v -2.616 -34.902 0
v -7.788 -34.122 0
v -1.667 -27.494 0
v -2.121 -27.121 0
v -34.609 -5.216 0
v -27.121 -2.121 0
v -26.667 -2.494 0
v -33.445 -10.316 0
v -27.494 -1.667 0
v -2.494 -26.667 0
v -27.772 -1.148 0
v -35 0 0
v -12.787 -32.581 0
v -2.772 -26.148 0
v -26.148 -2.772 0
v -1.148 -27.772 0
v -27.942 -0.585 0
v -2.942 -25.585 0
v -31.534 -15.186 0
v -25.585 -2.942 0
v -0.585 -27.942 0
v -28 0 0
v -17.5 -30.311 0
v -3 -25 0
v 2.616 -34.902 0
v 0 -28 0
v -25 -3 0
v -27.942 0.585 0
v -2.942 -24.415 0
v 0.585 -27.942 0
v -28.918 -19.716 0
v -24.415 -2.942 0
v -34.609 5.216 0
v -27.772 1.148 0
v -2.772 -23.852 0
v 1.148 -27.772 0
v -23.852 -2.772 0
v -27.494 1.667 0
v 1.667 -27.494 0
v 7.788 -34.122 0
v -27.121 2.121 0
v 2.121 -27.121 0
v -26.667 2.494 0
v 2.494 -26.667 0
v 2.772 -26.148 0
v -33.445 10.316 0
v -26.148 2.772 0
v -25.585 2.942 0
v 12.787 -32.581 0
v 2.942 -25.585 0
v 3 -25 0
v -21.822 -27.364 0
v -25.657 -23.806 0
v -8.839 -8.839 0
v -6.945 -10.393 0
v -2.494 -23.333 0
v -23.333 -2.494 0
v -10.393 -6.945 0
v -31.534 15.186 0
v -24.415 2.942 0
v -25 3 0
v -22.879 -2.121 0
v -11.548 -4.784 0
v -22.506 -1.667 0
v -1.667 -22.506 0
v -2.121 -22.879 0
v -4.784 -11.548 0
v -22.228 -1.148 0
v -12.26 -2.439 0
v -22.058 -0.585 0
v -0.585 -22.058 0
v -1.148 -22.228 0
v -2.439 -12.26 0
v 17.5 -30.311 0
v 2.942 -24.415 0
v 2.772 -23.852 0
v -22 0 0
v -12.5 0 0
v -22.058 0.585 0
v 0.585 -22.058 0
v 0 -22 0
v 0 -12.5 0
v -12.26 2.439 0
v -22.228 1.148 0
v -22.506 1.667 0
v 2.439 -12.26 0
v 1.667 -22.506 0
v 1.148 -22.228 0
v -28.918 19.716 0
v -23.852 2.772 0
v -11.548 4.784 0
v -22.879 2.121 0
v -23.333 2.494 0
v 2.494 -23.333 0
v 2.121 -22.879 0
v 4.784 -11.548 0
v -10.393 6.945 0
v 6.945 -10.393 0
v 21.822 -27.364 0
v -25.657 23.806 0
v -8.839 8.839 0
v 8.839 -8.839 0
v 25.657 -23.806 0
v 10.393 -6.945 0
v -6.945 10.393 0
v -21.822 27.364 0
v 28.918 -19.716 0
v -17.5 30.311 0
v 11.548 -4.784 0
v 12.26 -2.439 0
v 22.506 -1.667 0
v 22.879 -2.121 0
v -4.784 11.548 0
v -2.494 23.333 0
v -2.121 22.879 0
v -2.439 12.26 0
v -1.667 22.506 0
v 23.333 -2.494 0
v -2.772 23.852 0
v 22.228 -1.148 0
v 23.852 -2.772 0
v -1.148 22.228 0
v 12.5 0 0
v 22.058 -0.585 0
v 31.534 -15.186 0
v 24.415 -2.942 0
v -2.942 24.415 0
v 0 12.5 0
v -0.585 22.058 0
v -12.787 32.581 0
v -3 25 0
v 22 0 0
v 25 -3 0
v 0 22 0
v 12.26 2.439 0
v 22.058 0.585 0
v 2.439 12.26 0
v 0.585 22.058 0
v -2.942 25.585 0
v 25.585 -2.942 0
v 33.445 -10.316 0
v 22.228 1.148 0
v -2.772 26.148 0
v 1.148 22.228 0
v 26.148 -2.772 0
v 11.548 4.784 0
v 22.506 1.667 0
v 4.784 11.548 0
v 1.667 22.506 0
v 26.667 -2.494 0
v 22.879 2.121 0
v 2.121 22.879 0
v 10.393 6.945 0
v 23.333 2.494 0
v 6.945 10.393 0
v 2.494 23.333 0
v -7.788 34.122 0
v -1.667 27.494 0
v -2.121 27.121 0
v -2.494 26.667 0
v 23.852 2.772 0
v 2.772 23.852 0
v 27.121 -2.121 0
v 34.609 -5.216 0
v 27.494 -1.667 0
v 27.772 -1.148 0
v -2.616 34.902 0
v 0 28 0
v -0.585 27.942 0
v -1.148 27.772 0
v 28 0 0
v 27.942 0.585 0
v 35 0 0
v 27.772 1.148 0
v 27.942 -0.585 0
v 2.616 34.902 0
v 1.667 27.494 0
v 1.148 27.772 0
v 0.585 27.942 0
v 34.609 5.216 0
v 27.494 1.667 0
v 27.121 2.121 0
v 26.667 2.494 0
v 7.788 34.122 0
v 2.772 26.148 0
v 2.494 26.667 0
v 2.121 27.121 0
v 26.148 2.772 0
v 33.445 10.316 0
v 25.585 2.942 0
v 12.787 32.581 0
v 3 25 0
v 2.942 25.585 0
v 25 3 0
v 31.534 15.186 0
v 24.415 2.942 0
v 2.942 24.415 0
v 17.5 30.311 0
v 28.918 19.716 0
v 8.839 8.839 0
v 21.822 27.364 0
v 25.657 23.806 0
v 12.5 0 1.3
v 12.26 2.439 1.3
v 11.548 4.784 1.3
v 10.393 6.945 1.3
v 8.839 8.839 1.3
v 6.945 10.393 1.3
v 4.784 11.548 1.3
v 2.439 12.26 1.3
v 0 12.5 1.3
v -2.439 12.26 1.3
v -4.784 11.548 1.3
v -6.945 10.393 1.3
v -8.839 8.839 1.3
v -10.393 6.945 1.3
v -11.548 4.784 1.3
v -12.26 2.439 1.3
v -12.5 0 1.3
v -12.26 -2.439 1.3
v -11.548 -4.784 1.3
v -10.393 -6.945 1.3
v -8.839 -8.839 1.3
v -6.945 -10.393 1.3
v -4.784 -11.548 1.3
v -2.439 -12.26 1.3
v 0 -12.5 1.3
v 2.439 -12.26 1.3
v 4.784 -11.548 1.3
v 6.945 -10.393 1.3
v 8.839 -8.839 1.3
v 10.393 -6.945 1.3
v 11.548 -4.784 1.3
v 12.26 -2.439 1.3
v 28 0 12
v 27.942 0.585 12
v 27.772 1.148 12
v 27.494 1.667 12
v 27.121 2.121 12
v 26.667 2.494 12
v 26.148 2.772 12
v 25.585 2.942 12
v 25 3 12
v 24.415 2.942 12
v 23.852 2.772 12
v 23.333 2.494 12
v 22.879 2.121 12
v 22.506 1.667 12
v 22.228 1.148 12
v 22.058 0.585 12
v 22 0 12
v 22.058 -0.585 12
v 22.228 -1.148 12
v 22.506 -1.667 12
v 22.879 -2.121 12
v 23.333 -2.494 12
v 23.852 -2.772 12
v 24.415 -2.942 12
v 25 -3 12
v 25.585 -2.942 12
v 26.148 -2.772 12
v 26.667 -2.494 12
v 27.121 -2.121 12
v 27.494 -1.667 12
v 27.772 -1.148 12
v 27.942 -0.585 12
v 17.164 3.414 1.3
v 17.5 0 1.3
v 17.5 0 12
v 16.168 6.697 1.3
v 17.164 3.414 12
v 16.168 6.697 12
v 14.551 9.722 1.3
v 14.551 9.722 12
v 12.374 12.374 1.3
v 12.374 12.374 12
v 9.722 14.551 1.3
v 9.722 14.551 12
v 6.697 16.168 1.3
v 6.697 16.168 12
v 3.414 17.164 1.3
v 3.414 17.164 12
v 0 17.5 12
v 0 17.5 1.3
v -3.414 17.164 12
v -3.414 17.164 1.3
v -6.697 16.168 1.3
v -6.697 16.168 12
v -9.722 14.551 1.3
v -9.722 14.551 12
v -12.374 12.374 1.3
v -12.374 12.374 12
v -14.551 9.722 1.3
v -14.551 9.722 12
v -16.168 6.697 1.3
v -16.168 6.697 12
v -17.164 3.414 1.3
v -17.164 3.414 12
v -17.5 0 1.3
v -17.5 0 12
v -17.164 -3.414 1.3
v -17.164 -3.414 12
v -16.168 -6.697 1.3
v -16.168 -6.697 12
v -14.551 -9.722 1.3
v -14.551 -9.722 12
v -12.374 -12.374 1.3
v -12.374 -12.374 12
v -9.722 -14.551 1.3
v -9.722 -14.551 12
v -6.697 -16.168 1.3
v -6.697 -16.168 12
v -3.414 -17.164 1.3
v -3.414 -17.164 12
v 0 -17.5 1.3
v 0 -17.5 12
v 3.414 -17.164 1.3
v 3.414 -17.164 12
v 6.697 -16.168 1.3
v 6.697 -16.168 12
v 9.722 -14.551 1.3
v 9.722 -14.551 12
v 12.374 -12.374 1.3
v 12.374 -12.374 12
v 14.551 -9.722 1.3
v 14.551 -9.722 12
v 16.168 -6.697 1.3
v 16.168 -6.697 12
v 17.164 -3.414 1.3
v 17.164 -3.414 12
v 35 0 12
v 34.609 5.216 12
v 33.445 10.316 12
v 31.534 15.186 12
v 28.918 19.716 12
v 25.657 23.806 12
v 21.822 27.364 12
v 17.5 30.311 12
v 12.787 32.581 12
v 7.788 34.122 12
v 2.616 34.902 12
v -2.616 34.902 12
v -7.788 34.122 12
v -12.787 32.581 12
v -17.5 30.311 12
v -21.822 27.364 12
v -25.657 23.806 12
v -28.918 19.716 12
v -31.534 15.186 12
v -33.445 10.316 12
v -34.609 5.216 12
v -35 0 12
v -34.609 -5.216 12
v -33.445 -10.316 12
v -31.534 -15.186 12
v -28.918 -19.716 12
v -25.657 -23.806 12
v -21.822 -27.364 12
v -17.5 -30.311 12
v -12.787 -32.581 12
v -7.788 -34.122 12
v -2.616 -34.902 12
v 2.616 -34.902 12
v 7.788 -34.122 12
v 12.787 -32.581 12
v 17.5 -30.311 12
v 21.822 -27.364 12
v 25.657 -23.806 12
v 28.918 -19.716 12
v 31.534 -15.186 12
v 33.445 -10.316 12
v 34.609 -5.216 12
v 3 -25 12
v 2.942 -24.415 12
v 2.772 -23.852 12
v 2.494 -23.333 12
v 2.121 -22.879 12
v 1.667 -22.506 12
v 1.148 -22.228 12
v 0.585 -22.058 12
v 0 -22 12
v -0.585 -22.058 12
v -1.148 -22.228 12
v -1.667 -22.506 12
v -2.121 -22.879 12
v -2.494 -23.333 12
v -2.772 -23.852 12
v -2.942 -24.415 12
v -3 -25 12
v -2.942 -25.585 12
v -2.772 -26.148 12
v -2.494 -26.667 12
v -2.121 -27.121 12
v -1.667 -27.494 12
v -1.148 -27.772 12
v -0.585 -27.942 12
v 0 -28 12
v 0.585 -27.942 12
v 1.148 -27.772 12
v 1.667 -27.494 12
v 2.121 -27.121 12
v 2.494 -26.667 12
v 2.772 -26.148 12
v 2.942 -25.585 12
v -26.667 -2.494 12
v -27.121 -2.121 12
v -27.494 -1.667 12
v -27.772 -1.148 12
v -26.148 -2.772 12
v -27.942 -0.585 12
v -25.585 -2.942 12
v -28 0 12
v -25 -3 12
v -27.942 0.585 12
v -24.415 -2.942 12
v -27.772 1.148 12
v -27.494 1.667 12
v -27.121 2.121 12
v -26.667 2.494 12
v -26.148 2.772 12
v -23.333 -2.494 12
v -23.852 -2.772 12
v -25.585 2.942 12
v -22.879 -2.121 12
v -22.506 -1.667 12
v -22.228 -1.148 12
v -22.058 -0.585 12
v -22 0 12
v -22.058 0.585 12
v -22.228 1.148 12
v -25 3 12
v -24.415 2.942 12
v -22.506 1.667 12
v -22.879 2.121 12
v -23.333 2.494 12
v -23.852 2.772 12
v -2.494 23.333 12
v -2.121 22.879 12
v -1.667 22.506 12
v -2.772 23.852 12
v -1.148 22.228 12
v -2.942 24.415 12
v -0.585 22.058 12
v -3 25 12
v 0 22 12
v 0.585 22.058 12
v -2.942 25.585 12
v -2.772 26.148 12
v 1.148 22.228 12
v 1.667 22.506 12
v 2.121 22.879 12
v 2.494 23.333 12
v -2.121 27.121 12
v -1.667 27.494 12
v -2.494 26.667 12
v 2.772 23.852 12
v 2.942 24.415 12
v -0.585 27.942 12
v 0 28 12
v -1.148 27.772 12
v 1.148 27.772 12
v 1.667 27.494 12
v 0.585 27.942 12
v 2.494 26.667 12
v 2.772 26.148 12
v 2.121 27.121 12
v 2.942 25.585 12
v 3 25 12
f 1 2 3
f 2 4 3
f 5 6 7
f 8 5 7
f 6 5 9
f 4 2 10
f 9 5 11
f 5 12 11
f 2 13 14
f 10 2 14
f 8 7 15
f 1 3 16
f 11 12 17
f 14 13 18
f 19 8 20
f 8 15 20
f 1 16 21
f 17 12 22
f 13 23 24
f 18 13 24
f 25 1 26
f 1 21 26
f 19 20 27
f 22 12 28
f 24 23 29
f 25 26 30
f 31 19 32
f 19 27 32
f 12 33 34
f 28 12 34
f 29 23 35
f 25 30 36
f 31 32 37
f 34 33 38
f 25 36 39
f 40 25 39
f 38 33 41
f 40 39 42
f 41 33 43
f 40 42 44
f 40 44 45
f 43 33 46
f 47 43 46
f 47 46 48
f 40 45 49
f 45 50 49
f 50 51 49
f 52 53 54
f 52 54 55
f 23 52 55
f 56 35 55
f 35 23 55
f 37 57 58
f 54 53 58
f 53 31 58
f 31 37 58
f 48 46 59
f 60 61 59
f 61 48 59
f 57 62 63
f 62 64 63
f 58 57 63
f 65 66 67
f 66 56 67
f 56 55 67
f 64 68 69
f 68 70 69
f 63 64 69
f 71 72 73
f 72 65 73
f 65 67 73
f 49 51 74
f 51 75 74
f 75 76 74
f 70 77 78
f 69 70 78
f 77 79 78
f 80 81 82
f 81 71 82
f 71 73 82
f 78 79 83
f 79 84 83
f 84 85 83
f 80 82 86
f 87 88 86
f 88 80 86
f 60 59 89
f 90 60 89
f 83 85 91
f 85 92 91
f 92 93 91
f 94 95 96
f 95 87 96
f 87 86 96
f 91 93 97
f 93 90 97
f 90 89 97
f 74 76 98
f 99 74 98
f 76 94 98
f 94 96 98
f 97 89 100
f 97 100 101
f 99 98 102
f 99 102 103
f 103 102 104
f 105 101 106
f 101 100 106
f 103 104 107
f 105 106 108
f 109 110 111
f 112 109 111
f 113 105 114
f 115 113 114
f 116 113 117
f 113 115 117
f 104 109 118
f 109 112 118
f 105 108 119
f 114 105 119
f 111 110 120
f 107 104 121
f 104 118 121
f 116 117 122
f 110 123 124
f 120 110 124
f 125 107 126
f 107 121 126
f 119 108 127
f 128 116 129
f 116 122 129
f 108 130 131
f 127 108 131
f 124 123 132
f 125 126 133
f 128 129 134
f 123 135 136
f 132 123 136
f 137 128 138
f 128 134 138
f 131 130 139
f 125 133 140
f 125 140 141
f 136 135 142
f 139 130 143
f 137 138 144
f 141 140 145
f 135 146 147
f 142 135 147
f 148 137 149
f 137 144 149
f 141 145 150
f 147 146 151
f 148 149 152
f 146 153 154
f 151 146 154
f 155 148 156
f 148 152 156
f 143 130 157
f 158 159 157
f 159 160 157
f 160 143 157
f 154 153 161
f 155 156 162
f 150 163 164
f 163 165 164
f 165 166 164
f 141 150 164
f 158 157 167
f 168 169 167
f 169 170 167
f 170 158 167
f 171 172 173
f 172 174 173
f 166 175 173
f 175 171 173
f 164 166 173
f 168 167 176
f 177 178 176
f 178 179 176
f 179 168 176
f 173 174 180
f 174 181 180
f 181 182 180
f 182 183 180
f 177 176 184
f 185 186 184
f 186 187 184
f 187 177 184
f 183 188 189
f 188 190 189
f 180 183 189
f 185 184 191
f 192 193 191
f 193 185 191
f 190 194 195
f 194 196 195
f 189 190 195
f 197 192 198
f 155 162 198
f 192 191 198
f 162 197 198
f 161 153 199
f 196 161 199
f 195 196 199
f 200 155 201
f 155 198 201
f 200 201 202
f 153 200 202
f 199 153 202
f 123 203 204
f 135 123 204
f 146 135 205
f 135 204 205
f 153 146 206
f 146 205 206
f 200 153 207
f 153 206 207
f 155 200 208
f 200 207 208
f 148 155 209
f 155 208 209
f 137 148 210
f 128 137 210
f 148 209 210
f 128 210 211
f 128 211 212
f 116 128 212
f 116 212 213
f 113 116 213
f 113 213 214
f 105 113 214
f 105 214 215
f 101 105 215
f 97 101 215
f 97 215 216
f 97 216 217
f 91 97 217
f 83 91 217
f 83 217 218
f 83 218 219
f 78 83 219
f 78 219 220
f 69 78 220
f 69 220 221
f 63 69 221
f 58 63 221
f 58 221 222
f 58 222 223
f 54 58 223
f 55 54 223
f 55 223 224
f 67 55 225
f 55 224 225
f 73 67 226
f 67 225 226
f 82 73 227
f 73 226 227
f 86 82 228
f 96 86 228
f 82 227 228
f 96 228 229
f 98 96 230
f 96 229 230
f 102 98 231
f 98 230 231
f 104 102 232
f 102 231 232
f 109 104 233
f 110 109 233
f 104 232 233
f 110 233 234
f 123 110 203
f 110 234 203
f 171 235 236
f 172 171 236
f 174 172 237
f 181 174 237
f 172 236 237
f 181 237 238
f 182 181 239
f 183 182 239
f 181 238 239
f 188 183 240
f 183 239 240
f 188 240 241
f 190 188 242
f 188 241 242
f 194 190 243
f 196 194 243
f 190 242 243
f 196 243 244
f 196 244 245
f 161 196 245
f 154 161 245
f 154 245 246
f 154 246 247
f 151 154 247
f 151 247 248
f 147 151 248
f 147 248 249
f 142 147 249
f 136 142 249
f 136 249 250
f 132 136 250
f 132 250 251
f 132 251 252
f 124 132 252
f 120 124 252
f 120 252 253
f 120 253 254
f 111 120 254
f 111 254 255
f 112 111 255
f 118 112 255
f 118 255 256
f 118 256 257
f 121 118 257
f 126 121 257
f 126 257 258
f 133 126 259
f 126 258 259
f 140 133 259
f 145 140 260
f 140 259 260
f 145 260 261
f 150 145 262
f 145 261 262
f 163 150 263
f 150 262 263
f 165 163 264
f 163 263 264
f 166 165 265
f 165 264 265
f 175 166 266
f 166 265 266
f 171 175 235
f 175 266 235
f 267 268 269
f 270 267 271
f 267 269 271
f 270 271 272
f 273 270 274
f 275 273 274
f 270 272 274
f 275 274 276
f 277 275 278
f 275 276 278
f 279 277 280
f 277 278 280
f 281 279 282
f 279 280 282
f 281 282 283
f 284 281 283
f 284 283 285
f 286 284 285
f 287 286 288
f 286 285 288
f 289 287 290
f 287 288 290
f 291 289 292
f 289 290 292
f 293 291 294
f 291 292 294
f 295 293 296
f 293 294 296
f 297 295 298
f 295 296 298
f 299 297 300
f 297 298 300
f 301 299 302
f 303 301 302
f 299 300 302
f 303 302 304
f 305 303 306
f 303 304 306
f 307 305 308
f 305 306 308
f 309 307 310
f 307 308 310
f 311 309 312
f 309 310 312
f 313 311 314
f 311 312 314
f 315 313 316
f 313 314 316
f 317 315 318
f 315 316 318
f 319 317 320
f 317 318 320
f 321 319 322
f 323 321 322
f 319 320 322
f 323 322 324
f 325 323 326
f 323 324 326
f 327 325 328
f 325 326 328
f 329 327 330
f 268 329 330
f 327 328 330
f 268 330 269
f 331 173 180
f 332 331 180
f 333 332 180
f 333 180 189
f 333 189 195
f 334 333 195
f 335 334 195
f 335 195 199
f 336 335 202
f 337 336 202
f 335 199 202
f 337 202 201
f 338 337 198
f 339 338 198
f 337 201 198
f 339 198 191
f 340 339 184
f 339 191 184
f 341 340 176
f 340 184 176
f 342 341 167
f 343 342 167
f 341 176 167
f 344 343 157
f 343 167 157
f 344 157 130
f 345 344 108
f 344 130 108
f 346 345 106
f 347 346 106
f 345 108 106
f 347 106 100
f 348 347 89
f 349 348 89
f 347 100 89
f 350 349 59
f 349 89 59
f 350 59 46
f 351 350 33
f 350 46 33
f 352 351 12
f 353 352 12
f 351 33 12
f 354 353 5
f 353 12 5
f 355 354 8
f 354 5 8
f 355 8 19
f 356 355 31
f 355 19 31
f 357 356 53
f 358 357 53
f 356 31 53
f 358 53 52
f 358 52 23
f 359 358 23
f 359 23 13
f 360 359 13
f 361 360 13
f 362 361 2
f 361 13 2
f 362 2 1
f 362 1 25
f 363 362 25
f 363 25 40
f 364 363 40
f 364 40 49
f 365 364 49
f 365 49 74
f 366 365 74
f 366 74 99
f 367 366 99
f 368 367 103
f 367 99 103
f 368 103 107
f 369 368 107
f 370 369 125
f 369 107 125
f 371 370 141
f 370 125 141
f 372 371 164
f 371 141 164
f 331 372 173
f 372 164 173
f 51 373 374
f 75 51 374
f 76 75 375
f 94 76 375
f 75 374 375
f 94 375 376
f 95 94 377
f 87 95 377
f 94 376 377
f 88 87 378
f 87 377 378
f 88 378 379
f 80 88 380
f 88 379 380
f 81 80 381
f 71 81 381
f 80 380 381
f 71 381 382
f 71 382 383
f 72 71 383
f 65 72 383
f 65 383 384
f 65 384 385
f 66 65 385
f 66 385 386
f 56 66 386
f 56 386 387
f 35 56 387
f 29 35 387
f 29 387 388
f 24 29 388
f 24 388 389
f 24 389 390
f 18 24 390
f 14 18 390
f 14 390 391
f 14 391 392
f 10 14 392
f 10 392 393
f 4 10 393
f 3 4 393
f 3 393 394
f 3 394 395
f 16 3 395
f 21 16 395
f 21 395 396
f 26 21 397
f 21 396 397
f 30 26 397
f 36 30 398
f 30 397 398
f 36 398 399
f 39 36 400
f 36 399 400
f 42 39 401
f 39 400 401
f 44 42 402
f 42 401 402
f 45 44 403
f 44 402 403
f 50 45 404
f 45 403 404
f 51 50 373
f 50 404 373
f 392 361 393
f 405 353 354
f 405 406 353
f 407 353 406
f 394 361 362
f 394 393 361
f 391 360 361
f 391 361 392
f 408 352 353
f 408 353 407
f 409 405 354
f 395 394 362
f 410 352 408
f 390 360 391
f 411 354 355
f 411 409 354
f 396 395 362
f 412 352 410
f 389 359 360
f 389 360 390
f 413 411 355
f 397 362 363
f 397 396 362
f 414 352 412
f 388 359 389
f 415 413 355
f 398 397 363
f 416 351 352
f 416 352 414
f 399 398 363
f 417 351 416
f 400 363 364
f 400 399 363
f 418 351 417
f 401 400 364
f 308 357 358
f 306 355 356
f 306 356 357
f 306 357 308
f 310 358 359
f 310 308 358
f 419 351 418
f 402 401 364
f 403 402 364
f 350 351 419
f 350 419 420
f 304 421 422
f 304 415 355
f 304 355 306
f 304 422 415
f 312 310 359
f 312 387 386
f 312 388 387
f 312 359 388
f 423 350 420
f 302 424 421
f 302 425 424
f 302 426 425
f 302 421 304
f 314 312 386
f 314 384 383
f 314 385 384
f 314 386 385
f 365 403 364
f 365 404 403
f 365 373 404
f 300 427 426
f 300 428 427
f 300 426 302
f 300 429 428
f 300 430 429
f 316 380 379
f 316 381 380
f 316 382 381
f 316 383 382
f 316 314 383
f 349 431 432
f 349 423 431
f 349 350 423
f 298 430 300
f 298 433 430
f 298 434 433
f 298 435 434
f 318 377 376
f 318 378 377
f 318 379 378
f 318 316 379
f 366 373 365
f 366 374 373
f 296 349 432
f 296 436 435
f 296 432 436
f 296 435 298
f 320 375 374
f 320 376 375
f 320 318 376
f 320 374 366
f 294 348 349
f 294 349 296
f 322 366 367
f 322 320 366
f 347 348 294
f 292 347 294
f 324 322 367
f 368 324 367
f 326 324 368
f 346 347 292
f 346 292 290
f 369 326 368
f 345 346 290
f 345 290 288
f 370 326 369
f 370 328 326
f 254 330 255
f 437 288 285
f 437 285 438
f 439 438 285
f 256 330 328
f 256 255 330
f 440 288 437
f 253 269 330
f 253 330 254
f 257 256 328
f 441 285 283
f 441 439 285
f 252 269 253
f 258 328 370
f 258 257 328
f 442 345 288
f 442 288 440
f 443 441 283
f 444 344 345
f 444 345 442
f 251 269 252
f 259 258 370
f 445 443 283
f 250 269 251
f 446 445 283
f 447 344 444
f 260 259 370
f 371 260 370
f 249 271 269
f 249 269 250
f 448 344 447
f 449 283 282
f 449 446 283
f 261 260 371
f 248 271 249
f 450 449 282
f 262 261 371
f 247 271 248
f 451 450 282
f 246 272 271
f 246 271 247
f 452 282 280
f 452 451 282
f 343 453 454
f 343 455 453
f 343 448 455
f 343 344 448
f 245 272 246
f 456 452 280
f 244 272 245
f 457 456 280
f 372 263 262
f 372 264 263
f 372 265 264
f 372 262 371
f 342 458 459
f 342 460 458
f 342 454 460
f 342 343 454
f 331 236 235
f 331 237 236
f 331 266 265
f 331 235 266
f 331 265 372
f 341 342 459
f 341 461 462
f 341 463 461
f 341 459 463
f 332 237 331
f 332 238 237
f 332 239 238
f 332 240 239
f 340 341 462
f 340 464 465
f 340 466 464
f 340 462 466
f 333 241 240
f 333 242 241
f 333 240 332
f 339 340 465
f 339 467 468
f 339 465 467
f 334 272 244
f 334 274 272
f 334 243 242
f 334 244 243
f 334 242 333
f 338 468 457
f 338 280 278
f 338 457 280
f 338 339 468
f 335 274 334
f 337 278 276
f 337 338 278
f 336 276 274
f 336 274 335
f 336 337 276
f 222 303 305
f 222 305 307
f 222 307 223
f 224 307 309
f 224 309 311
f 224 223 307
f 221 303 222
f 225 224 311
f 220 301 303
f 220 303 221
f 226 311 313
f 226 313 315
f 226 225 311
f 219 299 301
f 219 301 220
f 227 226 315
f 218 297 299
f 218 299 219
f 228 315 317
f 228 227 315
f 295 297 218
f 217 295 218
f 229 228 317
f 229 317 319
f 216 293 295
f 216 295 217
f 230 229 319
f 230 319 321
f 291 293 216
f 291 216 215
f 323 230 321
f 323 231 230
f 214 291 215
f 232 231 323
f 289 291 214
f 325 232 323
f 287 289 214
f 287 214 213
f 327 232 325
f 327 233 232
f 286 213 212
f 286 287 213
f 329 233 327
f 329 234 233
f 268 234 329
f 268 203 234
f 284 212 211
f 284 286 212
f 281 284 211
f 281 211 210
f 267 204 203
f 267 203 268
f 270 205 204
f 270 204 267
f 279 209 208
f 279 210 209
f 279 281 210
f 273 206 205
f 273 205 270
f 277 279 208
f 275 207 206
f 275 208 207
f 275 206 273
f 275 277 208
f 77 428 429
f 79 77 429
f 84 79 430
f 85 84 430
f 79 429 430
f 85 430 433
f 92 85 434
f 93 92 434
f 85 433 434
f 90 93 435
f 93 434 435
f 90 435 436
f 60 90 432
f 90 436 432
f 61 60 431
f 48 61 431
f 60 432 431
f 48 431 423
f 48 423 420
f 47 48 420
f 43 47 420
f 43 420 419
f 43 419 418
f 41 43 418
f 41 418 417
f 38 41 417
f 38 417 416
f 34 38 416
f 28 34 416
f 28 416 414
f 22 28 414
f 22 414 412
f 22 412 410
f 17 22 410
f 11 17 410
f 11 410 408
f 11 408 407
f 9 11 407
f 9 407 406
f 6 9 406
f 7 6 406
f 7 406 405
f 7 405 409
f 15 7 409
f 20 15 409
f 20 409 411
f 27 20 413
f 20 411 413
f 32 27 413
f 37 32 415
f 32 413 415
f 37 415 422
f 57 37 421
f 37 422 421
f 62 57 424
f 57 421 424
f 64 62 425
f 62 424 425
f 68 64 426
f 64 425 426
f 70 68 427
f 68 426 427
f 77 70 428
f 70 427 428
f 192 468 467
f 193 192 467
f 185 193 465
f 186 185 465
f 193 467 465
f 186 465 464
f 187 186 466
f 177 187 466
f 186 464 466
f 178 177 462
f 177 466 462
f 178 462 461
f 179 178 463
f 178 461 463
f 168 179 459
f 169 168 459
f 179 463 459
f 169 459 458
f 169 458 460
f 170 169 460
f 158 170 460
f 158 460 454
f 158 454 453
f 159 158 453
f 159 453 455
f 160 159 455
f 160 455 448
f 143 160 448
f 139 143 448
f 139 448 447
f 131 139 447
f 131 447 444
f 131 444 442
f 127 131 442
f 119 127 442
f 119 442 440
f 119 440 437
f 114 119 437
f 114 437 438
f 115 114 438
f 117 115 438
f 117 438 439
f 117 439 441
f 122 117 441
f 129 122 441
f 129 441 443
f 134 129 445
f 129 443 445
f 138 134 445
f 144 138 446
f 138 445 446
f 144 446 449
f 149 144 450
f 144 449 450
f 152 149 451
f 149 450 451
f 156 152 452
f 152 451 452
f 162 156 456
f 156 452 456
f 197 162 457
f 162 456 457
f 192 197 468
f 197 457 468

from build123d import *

# Parameters (mm, degrees)
F0_R     = 35
F1_DEPTH = 12
F2_R     = 12.5
F3_DEPTH = 25
F4_R     = 17.5
F5_DEPTH = 10.7
F6_R     = 3
F7_DEPTH = 25


with BuildPart() as f1:
    # F0 (on Top) → F1 (new body)
    with BuildSketch(Plane.XY):
        Circle(F0_R)
    extrude(amount=F1_DEPTH)

    # F2 (on face) → F3 (cut)
    with BuildSketch(Plane.XY.offset(12)):
        Circle(F2_R)
    extrude(amount=-F3_DEPTH, mode=Mode.SUBTRACT)

    # F4 (on face) → F5 (cut)
    with BuildSketch(Plane.XY.offset(12)):
        Circle(F4_R)
    extrude(amount=-F5_DEPTH, mode=Mode.SUBTRACT)

    # F6 (on face) → F7 (cut)
    with BuildSketch(Plane.XY.offset(12)):
        with Locations((-25, 0)):
            Circle(F6_R)
        with Locations((0, 25)):
            Circle(F6_R)
        with Locations((25, 0)):
            Circle(F6_R)
        with Locations((0, -25)):
            Circle(F6_R)
    extrude(amount=-F7_DEPTH, mode=Mode.SUBTRACT)


solid = f1.part
